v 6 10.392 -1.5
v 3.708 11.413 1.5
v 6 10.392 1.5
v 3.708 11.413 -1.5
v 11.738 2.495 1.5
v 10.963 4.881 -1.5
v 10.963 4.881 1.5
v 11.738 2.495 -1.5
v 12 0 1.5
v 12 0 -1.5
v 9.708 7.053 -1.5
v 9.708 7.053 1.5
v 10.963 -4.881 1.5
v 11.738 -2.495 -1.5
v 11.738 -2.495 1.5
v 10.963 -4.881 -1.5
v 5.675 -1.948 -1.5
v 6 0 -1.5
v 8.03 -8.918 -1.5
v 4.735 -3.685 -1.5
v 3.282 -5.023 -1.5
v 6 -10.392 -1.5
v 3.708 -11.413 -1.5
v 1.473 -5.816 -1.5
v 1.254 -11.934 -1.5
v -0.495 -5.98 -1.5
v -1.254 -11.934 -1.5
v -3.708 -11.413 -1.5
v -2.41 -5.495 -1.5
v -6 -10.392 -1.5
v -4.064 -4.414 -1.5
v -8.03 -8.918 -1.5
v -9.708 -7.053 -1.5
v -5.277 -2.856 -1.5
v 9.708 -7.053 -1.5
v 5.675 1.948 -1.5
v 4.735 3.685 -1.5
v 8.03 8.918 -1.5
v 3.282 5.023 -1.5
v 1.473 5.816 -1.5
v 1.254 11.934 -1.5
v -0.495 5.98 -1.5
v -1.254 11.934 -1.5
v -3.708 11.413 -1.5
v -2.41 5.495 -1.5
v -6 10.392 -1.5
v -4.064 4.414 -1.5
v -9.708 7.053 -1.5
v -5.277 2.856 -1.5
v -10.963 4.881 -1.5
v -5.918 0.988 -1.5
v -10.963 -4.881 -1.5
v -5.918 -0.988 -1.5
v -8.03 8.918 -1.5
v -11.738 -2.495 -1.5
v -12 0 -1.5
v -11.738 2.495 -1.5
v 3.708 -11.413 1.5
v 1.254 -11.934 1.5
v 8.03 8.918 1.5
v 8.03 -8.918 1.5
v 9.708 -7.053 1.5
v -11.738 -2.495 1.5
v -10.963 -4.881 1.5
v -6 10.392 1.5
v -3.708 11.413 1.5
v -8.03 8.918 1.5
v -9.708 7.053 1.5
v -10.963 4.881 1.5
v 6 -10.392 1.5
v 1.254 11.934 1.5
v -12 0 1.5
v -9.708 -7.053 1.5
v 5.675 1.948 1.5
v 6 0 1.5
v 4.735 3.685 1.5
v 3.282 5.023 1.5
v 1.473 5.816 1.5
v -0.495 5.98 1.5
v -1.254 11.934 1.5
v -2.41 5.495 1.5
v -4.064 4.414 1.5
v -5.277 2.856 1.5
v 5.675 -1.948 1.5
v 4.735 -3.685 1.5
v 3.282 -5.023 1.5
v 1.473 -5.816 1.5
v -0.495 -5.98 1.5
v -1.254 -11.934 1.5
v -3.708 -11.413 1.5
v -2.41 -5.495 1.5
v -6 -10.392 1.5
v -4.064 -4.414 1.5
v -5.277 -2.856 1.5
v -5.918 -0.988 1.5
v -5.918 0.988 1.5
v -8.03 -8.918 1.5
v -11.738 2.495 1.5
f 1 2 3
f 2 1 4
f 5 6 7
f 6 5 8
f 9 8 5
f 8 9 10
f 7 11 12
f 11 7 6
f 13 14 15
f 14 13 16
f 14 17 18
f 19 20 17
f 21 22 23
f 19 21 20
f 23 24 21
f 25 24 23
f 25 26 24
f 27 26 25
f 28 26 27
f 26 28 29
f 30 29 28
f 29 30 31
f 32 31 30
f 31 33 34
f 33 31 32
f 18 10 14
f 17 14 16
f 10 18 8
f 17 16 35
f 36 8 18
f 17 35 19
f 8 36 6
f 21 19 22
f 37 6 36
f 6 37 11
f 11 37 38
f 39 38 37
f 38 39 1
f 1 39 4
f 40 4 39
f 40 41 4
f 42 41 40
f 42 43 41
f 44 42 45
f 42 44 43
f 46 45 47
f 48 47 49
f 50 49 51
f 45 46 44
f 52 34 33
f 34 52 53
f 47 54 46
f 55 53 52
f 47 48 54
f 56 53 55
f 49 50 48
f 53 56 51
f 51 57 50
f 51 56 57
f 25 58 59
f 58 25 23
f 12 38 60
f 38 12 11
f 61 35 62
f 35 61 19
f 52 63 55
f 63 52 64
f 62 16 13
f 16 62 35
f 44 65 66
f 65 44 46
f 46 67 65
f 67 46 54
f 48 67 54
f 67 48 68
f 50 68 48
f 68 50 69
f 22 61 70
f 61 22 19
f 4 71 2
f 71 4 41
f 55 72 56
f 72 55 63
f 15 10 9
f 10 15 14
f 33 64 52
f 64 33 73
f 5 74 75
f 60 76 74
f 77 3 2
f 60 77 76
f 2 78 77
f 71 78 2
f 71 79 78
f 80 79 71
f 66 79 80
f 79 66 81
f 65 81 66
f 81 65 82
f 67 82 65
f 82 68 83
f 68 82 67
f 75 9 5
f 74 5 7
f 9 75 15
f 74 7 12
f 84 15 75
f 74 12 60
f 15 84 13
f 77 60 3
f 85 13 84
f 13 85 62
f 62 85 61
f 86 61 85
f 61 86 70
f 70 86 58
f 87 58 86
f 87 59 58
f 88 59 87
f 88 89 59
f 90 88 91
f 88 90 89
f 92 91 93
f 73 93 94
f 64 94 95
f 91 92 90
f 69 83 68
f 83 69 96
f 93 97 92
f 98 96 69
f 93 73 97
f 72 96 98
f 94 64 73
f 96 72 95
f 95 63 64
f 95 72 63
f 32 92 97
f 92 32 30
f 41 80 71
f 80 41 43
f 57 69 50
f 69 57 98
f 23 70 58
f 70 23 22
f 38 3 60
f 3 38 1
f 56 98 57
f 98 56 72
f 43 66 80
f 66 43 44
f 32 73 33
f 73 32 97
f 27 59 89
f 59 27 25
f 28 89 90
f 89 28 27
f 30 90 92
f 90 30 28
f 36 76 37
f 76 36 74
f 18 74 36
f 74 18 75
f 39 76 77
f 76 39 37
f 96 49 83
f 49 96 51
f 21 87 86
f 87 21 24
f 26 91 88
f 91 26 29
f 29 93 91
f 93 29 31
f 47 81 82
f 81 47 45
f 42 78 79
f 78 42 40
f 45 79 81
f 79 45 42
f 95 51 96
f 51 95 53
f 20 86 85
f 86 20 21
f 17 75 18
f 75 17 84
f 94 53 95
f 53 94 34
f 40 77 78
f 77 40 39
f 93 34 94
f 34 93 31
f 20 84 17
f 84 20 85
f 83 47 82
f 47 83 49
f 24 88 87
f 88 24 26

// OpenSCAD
// A standard washer that has a nominal diameter of 12mm
difference() {
  cylinder(d=24, h=3, center=true);
  cylinder(d=12, h=4, center=true);
}
